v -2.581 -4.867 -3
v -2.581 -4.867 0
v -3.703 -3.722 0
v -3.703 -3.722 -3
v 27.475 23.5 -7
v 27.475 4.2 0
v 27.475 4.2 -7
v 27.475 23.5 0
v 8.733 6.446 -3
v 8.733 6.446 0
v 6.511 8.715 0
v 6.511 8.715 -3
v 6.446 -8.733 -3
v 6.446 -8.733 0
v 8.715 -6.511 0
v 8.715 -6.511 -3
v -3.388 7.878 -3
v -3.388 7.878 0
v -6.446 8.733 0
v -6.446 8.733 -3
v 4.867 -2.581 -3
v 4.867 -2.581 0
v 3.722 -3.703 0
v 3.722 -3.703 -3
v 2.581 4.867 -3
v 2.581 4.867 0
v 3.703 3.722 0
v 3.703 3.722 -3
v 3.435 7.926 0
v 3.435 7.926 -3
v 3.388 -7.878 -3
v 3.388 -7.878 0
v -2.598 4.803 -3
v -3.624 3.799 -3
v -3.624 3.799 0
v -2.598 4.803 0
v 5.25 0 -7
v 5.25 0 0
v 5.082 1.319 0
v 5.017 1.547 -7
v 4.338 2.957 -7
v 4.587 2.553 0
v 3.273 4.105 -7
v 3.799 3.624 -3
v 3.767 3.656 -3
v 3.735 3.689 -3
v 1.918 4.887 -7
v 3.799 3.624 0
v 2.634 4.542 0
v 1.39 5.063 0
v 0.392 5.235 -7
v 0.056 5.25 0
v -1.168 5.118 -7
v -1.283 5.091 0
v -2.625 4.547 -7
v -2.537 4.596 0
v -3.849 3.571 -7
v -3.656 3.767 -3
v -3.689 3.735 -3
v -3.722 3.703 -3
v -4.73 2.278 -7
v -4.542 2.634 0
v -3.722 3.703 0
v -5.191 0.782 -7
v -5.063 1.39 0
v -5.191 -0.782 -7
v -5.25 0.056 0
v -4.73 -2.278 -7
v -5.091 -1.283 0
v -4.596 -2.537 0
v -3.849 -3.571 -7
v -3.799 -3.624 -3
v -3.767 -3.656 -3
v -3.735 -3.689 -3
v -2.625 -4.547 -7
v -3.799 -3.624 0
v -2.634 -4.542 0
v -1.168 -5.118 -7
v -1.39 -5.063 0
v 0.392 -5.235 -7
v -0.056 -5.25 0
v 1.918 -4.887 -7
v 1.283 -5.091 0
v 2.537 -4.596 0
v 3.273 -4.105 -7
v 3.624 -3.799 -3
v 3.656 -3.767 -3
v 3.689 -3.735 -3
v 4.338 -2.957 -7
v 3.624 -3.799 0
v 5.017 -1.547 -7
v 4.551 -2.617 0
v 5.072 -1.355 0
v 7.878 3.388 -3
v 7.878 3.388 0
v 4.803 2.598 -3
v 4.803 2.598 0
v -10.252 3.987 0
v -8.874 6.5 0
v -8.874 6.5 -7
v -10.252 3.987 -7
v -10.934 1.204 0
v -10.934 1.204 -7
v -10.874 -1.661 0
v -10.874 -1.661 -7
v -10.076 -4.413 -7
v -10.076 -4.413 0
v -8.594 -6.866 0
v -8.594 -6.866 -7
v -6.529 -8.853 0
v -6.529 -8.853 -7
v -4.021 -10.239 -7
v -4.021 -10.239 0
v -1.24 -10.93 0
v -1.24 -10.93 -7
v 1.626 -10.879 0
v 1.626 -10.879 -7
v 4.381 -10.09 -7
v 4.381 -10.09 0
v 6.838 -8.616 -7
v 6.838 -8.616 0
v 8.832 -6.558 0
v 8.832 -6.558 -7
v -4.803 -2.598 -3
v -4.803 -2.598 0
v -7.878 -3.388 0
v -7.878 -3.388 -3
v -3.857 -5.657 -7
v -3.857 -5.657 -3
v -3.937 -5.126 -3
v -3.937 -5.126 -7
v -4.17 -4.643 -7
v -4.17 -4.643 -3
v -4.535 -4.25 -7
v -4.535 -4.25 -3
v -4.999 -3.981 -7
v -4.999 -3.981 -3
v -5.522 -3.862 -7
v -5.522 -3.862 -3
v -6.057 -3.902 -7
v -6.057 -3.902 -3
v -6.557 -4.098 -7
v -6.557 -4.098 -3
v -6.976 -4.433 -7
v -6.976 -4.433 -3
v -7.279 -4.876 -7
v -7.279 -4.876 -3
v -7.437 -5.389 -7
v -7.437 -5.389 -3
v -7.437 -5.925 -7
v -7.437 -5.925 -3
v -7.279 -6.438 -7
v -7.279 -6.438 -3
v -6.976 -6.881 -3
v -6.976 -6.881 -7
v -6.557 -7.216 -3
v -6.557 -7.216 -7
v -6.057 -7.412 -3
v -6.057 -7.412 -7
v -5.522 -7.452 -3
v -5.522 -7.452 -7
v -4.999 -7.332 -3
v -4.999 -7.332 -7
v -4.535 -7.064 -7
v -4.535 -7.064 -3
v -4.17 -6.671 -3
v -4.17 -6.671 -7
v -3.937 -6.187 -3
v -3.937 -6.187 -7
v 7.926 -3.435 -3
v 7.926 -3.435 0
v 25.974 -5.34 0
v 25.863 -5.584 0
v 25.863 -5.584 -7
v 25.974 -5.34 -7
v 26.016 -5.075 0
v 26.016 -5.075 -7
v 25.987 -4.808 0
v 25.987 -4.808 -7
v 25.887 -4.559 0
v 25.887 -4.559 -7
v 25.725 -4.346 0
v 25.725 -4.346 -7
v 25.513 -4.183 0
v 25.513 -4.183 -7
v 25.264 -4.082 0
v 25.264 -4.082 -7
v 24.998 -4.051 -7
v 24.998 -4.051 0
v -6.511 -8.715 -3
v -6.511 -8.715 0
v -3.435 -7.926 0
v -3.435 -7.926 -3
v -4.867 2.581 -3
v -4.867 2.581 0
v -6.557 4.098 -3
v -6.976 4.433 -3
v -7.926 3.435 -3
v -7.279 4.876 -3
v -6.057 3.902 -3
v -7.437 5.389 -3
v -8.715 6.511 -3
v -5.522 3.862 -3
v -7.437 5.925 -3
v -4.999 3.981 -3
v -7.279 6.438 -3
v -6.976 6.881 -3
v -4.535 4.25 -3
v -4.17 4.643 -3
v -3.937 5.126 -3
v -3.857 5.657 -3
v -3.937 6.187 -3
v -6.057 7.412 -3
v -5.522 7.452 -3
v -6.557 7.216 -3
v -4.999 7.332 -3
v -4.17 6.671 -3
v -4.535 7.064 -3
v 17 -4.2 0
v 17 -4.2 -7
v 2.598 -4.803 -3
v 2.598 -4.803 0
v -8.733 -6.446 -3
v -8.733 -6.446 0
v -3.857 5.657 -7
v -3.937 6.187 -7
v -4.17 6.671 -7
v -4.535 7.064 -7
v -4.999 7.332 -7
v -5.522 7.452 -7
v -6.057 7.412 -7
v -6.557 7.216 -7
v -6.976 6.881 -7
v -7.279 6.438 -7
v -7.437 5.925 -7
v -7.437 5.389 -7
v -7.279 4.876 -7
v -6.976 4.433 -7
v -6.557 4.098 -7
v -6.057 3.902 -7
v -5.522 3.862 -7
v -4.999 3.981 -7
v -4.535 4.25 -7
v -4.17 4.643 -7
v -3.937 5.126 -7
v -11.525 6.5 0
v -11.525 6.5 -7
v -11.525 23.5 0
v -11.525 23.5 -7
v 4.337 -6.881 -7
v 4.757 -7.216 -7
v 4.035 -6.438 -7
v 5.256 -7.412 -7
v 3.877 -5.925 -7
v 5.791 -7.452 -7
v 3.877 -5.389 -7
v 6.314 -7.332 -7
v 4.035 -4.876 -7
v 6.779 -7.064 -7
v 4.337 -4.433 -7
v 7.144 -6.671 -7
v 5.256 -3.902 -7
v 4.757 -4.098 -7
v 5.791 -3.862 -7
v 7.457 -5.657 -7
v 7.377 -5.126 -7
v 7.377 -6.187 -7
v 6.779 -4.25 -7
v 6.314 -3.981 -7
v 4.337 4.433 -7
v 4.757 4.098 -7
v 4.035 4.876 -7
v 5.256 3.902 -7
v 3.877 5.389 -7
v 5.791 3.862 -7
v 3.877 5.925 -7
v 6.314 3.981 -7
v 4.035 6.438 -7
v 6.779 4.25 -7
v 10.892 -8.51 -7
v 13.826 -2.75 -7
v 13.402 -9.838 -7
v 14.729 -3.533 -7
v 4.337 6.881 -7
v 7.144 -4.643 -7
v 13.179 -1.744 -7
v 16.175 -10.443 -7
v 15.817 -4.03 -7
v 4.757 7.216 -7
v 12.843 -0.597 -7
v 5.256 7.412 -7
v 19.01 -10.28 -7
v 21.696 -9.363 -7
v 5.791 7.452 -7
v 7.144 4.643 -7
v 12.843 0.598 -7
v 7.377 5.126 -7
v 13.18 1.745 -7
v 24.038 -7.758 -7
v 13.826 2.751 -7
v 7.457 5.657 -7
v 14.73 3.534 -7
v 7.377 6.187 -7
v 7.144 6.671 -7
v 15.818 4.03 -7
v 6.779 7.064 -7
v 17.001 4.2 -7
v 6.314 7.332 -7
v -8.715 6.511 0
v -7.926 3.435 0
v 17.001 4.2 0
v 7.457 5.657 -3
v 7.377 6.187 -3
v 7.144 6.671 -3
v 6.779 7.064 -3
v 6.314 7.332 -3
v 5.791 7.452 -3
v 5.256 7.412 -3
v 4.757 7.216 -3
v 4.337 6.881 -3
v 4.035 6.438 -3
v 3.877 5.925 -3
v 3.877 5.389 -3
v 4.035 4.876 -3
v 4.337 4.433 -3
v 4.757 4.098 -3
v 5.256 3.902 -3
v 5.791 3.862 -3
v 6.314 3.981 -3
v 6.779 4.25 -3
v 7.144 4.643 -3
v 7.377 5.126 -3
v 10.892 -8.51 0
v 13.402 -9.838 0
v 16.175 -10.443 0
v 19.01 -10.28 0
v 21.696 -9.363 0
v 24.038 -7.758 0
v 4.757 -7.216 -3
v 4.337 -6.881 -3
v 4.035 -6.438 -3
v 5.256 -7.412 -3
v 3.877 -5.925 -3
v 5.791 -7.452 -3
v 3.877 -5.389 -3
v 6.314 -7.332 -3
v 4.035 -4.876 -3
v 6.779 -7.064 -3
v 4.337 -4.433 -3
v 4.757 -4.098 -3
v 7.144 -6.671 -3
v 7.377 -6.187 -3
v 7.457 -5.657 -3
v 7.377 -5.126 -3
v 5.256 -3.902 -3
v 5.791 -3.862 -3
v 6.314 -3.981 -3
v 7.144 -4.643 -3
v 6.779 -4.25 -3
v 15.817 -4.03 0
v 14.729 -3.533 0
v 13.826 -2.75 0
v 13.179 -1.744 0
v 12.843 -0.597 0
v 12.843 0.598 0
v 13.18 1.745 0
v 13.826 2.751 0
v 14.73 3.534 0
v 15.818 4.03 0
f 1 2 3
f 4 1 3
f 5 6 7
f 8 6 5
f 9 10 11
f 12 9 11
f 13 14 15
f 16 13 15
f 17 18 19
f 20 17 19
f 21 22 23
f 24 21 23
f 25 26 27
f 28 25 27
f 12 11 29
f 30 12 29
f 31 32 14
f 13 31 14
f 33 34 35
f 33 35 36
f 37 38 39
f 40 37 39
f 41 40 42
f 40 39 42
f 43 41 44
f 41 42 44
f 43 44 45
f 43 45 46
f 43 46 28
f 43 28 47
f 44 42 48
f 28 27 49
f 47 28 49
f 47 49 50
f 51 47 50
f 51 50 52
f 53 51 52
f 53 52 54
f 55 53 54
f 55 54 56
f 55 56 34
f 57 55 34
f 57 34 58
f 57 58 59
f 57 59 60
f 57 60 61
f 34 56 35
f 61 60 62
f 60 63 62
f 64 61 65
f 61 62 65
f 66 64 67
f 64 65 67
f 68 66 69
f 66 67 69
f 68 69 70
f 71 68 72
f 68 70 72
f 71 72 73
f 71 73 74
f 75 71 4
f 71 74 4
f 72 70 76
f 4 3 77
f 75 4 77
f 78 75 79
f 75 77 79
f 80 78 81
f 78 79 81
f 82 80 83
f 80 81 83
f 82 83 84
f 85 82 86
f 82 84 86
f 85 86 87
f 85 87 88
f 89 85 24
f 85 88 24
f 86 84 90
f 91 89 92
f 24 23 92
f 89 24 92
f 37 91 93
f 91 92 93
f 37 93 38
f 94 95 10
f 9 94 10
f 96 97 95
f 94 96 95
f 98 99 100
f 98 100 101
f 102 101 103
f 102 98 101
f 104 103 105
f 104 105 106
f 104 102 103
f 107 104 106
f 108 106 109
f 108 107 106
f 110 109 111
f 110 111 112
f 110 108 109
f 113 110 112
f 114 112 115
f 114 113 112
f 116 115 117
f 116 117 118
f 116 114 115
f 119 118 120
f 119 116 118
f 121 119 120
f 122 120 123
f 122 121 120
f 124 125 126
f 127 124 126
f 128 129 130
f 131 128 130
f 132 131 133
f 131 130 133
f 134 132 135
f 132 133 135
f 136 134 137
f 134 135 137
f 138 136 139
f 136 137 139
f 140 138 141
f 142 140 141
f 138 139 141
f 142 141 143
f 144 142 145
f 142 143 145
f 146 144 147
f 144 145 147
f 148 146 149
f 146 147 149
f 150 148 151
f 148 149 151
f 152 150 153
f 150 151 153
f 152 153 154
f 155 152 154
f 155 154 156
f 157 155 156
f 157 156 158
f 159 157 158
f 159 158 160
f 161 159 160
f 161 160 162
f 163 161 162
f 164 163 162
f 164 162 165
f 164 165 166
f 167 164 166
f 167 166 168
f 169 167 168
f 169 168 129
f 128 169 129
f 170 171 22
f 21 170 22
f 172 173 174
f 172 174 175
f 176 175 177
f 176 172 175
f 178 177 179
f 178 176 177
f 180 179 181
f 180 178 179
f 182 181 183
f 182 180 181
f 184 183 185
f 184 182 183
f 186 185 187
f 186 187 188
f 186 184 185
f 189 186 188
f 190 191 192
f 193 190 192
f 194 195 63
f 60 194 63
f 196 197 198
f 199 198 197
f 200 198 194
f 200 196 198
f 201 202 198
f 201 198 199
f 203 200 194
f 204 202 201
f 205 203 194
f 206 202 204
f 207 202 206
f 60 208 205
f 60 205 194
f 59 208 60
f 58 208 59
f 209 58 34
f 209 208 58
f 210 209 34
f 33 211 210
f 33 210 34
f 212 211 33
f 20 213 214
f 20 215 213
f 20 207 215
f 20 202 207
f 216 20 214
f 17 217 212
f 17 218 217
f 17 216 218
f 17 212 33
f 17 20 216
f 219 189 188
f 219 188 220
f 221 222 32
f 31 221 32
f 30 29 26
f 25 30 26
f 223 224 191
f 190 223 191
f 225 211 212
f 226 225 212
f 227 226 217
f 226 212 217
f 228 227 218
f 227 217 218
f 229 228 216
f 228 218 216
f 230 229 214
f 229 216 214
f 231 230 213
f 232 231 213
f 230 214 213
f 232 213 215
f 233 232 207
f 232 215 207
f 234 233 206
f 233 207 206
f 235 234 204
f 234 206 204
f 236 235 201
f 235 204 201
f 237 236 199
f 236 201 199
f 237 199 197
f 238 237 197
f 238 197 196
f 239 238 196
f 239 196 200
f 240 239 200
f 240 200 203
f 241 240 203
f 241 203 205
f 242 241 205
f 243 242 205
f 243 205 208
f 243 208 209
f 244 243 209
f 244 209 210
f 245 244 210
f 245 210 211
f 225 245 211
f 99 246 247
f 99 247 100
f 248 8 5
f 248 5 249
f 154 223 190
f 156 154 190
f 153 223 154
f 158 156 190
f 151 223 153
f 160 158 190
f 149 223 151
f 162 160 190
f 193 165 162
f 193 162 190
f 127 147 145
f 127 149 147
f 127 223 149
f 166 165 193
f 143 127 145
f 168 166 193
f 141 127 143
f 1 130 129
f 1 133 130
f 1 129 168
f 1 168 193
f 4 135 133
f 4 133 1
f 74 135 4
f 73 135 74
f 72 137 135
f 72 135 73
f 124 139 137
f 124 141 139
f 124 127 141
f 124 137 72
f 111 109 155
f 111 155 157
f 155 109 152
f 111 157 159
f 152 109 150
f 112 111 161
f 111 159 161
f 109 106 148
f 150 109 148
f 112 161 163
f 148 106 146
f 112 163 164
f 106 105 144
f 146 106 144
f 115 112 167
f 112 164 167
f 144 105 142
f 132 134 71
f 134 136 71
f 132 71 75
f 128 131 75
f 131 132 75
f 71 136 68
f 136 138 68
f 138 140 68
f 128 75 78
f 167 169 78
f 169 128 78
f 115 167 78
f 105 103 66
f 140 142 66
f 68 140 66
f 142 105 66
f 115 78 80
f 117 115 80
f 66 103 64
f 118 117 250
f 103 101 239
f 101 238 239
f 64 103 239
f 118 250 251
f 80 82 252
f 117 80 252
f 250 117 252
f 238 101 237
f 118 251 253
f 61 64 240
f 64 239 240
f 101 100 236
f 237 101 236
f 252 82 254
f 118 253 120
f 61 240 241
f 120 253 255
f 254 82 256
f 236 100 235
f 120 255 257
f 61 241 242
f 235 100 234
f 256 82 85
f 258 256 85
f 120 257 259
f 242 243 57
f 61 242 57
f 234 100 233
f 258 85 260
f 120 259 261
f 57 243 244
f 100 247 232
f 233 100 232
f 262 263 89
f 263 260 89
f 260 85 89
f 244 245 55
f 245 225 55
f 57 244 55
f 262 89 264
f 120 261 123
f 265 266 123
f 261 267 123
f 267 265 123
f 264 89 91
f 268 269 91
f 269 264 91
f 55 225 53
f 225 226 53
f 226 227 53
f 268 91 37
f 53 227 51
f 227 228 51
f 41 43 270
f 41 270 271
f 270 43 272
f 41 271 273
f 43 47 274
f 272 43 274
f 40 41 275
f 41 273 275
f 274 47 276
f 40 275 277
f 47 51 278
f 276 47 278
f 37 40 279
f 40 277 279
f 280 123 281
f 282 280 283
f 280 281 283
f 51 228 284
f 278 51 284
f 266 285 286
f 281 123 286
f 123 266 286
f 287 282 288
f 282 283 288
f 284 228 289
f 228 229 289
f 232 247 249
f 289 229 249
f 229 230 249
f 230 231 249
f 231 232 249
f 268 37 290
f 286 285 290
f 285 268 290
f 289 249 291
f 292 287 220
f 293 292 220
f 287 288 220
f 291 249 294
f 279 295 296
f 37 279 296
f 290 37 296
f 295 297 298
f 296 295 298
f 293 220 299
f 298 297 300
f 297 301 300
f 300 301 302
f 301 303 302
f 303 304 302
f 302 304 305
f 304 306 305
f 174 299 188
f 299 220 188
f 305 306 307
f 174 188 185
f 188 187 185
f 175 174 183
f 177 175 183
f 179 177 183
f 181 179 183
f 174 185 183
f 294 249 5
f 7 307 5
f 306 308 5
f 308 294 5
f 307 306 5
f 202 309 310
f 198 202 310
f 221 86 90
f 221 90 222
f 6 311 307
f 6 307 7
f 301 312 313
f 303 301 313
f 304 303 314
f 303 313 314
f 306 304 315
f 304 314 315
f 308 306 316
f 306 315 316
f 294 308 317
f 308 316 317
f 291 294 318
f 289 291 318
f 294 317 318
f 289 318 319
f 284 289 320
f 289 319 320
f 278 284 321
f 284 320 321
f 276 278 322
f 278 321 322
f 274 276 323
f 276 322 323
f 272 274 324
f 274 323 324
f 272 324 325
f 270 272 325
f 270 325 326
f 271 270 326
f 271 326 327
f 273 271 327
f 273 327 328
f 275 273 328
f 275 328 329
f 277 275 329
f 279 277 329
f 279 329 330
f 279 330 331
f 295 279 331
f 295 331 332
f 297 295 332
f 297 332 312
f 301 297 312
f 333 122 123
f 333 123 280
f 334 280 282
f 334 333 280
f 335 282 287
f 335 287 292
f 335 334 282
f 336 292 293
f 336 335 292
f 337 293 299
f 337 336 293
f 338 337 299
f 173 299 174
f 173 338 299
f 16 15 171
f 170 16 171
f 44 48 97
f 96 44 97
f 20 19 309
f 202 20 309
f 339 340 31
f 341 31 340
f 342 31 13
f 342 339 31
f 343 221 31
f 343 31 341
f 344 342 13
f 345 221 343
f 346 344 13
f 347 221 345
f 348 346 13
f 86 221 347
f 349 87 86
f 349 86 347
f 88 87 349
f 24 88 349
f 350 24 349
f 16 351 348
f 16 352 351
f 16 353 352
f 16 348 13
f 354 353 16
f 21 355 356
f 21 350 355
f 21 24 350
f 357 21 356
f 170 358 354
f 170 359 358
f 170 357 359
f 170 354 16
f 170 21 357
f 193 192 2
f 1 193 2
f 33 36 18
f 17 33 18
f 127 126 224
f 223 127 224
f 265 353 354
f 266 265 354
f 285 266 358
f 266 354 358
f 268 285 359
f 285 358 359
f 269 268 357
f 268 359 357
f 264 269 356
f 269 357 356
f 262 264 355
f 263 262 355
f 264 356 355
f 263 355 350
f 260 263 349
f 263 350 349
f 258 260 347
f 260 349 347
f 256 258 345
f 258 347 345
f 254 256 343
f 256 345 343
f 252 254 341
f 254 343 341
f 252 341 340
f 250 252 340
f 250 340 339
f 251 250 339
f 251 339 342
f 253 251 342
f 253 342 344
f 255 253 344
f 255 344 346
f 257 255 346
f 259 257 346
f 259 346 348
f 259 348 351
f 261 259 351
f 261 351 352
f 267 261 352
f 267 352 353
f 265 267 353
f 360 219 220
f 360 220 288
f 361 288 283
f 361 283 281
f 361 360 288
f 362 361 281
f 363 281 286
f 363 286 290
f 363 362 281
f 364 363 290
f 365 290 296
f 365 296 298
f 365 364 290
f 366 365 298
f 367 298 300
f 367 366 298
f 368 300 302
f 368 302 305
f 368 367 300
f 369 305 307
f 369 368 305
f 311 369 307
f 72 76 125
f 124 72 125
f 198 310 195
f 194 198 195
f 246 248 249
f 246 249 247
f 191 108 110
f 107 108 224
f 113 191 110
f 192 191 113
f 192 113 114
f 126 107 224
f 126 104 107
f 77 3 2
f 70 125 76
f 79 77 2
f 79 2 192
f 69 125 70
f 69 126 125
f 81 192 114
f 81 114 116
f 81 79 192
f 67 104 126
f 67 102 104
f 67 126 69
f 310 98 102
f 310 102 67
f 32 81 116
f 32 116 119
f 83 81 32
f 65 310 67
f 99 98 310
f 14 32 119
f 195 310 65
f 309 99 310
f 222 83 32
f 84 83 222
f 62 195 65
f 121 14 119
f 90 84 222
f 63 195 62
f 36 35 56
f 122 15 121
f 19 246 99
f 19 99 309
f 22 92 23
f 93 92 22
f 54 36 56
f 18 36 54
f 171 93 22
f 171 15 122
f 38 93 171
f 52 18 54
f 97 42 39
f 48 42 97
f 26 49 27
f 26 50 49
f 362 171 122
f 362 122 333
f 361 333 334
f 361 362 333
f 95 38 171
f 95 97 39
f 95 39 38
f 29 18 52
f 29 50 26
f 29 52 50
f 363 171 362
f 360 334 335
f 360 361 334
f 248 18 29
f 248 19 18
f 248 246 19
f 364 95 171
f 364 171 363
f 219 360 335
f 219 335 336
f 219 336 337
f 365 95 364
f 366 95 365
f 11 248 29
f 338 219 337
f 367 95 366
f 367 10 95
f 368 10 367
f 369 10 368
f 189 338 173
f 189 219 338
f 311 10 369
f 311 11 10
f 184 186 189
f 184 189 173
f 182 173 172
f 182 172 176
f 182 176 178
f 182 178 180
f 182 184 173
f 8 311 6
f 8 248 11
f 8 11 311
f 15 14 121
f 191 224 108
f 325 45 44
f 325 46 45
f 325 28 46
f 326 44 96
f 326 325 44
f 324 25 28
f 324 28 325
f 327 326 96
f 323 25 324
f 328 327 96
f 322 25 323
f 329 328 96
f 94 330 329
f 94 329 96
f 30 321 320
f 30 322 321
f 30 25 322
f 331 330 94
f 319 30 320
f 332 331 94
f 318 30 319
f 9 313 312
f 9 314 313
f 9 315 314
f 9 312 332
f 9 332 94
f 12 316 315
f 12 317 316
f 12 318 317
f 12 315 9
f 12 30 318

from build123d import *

# Parameters (mm, degrees)
F0_R     = 1.8
F0_R_2   = 5.25
F1_DEPTH = 7
F3_DEPTH = 3


# Not quite as in the source:
# - a feature names something its author has since deleted; it is built from what else it names


with BuildPart() as f1:
    # F0 (on Top) → F1 (new body)
    with BuildSketch(Plane.XY):
        with BuildLine():
            ThreePointArc((17, -4.2), (12.8000000278, 0.000483474), (17.000966948, 4.1999998887))
            Line((17.000966948, 4.1999998887), (27.4750051144, 4.1999998887))
            Line((27.4750051144, 4.1999998887), (27.4750051144, 23.499993239))
            Line((27.4750051144, 23.499993239), (-11.5249948856, 23.5))
            Line((-11.5249948856, 23.5), (-11.5249978328, 6.5))
            Line((-11.5249978328, 6.5), (-8.8741196746, 6.5))
            ThreePointArc((-8.8741196746, 6.5), (-6.5288626997, -8.8529064068), (8.8315992647, -6.5576561688))
            ThreePointArc((8.8315992647, -6.5576561688), (17.5981324789, -10.4579090901), (25.8628092229, -5.5835685434))
            ThreePointArc((25.8628092229, -5.5835685434), (25.8873322976, -4.5593941021), (24.9978561691, -4.051096075))
            Line((24.9978561691, -4.051096075), (17, -4.2))
        make_face()
        with Locations((-5.6568542495, -5.6568542495)):
            Circle(F0_R, mode=Mode.SUBTRACT)
        with Locations((5.6568542495, -5.6568542495)):
            Circle(F0_R, mode=Mode.SUBTRACT)
        with Locations((-5.6568542495, 5.6568542495)):
            Circle(F0_R, mode=Mode.SUBTRACT)
        Circle(F0_R_2, mode=Mode.SUBTRACT)
        with Locations((5.6568542495, 5.6568542495)):
            Circle(F0_R, mode=Mode.SUBTRACT)
    extrude(amount=-F1_DEPTH)

    # F2 (on face) → F3 (cut)
    with BuildSketch(Plane.XY):
        Polygon((-7.8783541444, -3.3878739609), (-8.7325987676, -6.4462394487), (-6.5110988727, -8.7152197373), (-3.4353543546, -7.9258345381), (-2.5811097314, -4.8674690503), (-4.8026096263, -2.5984887617), align=None)
        Polygon((3.3878739609, -7.8783541444), (6.4462394487, -8.7325987676), (8.7152197373, -6.5110988727), (7.9258345381, -3.4353543546), (4.8674690503, -2.5811097314), (2.5984887617, -4.8026096263), align=None)
        Polygon((7.8783541444, 3.3878739609), (8.7325987676, 6.4462394487), (6.5110988727, 8.7152197373), (3.4353543546, 7.9258345381), (2.5811097314, 4.8674690503), (4.8026096263, 2.5984887617), align=None)
        Polygon((-3.3878739609, 7.8783541444), (-6.4462394487, 8.7325987676), (-8.7152197373, 6.5110988727), (-7.9258345381, 3.4353543546), (-4.8674690503, 2.5811097314), (-2.5984887617, 4.8026096263), align=None)
    extrude(amount=-F3_DEPTH, mode=Mode.SUBTRACT)


solid = f1.part
